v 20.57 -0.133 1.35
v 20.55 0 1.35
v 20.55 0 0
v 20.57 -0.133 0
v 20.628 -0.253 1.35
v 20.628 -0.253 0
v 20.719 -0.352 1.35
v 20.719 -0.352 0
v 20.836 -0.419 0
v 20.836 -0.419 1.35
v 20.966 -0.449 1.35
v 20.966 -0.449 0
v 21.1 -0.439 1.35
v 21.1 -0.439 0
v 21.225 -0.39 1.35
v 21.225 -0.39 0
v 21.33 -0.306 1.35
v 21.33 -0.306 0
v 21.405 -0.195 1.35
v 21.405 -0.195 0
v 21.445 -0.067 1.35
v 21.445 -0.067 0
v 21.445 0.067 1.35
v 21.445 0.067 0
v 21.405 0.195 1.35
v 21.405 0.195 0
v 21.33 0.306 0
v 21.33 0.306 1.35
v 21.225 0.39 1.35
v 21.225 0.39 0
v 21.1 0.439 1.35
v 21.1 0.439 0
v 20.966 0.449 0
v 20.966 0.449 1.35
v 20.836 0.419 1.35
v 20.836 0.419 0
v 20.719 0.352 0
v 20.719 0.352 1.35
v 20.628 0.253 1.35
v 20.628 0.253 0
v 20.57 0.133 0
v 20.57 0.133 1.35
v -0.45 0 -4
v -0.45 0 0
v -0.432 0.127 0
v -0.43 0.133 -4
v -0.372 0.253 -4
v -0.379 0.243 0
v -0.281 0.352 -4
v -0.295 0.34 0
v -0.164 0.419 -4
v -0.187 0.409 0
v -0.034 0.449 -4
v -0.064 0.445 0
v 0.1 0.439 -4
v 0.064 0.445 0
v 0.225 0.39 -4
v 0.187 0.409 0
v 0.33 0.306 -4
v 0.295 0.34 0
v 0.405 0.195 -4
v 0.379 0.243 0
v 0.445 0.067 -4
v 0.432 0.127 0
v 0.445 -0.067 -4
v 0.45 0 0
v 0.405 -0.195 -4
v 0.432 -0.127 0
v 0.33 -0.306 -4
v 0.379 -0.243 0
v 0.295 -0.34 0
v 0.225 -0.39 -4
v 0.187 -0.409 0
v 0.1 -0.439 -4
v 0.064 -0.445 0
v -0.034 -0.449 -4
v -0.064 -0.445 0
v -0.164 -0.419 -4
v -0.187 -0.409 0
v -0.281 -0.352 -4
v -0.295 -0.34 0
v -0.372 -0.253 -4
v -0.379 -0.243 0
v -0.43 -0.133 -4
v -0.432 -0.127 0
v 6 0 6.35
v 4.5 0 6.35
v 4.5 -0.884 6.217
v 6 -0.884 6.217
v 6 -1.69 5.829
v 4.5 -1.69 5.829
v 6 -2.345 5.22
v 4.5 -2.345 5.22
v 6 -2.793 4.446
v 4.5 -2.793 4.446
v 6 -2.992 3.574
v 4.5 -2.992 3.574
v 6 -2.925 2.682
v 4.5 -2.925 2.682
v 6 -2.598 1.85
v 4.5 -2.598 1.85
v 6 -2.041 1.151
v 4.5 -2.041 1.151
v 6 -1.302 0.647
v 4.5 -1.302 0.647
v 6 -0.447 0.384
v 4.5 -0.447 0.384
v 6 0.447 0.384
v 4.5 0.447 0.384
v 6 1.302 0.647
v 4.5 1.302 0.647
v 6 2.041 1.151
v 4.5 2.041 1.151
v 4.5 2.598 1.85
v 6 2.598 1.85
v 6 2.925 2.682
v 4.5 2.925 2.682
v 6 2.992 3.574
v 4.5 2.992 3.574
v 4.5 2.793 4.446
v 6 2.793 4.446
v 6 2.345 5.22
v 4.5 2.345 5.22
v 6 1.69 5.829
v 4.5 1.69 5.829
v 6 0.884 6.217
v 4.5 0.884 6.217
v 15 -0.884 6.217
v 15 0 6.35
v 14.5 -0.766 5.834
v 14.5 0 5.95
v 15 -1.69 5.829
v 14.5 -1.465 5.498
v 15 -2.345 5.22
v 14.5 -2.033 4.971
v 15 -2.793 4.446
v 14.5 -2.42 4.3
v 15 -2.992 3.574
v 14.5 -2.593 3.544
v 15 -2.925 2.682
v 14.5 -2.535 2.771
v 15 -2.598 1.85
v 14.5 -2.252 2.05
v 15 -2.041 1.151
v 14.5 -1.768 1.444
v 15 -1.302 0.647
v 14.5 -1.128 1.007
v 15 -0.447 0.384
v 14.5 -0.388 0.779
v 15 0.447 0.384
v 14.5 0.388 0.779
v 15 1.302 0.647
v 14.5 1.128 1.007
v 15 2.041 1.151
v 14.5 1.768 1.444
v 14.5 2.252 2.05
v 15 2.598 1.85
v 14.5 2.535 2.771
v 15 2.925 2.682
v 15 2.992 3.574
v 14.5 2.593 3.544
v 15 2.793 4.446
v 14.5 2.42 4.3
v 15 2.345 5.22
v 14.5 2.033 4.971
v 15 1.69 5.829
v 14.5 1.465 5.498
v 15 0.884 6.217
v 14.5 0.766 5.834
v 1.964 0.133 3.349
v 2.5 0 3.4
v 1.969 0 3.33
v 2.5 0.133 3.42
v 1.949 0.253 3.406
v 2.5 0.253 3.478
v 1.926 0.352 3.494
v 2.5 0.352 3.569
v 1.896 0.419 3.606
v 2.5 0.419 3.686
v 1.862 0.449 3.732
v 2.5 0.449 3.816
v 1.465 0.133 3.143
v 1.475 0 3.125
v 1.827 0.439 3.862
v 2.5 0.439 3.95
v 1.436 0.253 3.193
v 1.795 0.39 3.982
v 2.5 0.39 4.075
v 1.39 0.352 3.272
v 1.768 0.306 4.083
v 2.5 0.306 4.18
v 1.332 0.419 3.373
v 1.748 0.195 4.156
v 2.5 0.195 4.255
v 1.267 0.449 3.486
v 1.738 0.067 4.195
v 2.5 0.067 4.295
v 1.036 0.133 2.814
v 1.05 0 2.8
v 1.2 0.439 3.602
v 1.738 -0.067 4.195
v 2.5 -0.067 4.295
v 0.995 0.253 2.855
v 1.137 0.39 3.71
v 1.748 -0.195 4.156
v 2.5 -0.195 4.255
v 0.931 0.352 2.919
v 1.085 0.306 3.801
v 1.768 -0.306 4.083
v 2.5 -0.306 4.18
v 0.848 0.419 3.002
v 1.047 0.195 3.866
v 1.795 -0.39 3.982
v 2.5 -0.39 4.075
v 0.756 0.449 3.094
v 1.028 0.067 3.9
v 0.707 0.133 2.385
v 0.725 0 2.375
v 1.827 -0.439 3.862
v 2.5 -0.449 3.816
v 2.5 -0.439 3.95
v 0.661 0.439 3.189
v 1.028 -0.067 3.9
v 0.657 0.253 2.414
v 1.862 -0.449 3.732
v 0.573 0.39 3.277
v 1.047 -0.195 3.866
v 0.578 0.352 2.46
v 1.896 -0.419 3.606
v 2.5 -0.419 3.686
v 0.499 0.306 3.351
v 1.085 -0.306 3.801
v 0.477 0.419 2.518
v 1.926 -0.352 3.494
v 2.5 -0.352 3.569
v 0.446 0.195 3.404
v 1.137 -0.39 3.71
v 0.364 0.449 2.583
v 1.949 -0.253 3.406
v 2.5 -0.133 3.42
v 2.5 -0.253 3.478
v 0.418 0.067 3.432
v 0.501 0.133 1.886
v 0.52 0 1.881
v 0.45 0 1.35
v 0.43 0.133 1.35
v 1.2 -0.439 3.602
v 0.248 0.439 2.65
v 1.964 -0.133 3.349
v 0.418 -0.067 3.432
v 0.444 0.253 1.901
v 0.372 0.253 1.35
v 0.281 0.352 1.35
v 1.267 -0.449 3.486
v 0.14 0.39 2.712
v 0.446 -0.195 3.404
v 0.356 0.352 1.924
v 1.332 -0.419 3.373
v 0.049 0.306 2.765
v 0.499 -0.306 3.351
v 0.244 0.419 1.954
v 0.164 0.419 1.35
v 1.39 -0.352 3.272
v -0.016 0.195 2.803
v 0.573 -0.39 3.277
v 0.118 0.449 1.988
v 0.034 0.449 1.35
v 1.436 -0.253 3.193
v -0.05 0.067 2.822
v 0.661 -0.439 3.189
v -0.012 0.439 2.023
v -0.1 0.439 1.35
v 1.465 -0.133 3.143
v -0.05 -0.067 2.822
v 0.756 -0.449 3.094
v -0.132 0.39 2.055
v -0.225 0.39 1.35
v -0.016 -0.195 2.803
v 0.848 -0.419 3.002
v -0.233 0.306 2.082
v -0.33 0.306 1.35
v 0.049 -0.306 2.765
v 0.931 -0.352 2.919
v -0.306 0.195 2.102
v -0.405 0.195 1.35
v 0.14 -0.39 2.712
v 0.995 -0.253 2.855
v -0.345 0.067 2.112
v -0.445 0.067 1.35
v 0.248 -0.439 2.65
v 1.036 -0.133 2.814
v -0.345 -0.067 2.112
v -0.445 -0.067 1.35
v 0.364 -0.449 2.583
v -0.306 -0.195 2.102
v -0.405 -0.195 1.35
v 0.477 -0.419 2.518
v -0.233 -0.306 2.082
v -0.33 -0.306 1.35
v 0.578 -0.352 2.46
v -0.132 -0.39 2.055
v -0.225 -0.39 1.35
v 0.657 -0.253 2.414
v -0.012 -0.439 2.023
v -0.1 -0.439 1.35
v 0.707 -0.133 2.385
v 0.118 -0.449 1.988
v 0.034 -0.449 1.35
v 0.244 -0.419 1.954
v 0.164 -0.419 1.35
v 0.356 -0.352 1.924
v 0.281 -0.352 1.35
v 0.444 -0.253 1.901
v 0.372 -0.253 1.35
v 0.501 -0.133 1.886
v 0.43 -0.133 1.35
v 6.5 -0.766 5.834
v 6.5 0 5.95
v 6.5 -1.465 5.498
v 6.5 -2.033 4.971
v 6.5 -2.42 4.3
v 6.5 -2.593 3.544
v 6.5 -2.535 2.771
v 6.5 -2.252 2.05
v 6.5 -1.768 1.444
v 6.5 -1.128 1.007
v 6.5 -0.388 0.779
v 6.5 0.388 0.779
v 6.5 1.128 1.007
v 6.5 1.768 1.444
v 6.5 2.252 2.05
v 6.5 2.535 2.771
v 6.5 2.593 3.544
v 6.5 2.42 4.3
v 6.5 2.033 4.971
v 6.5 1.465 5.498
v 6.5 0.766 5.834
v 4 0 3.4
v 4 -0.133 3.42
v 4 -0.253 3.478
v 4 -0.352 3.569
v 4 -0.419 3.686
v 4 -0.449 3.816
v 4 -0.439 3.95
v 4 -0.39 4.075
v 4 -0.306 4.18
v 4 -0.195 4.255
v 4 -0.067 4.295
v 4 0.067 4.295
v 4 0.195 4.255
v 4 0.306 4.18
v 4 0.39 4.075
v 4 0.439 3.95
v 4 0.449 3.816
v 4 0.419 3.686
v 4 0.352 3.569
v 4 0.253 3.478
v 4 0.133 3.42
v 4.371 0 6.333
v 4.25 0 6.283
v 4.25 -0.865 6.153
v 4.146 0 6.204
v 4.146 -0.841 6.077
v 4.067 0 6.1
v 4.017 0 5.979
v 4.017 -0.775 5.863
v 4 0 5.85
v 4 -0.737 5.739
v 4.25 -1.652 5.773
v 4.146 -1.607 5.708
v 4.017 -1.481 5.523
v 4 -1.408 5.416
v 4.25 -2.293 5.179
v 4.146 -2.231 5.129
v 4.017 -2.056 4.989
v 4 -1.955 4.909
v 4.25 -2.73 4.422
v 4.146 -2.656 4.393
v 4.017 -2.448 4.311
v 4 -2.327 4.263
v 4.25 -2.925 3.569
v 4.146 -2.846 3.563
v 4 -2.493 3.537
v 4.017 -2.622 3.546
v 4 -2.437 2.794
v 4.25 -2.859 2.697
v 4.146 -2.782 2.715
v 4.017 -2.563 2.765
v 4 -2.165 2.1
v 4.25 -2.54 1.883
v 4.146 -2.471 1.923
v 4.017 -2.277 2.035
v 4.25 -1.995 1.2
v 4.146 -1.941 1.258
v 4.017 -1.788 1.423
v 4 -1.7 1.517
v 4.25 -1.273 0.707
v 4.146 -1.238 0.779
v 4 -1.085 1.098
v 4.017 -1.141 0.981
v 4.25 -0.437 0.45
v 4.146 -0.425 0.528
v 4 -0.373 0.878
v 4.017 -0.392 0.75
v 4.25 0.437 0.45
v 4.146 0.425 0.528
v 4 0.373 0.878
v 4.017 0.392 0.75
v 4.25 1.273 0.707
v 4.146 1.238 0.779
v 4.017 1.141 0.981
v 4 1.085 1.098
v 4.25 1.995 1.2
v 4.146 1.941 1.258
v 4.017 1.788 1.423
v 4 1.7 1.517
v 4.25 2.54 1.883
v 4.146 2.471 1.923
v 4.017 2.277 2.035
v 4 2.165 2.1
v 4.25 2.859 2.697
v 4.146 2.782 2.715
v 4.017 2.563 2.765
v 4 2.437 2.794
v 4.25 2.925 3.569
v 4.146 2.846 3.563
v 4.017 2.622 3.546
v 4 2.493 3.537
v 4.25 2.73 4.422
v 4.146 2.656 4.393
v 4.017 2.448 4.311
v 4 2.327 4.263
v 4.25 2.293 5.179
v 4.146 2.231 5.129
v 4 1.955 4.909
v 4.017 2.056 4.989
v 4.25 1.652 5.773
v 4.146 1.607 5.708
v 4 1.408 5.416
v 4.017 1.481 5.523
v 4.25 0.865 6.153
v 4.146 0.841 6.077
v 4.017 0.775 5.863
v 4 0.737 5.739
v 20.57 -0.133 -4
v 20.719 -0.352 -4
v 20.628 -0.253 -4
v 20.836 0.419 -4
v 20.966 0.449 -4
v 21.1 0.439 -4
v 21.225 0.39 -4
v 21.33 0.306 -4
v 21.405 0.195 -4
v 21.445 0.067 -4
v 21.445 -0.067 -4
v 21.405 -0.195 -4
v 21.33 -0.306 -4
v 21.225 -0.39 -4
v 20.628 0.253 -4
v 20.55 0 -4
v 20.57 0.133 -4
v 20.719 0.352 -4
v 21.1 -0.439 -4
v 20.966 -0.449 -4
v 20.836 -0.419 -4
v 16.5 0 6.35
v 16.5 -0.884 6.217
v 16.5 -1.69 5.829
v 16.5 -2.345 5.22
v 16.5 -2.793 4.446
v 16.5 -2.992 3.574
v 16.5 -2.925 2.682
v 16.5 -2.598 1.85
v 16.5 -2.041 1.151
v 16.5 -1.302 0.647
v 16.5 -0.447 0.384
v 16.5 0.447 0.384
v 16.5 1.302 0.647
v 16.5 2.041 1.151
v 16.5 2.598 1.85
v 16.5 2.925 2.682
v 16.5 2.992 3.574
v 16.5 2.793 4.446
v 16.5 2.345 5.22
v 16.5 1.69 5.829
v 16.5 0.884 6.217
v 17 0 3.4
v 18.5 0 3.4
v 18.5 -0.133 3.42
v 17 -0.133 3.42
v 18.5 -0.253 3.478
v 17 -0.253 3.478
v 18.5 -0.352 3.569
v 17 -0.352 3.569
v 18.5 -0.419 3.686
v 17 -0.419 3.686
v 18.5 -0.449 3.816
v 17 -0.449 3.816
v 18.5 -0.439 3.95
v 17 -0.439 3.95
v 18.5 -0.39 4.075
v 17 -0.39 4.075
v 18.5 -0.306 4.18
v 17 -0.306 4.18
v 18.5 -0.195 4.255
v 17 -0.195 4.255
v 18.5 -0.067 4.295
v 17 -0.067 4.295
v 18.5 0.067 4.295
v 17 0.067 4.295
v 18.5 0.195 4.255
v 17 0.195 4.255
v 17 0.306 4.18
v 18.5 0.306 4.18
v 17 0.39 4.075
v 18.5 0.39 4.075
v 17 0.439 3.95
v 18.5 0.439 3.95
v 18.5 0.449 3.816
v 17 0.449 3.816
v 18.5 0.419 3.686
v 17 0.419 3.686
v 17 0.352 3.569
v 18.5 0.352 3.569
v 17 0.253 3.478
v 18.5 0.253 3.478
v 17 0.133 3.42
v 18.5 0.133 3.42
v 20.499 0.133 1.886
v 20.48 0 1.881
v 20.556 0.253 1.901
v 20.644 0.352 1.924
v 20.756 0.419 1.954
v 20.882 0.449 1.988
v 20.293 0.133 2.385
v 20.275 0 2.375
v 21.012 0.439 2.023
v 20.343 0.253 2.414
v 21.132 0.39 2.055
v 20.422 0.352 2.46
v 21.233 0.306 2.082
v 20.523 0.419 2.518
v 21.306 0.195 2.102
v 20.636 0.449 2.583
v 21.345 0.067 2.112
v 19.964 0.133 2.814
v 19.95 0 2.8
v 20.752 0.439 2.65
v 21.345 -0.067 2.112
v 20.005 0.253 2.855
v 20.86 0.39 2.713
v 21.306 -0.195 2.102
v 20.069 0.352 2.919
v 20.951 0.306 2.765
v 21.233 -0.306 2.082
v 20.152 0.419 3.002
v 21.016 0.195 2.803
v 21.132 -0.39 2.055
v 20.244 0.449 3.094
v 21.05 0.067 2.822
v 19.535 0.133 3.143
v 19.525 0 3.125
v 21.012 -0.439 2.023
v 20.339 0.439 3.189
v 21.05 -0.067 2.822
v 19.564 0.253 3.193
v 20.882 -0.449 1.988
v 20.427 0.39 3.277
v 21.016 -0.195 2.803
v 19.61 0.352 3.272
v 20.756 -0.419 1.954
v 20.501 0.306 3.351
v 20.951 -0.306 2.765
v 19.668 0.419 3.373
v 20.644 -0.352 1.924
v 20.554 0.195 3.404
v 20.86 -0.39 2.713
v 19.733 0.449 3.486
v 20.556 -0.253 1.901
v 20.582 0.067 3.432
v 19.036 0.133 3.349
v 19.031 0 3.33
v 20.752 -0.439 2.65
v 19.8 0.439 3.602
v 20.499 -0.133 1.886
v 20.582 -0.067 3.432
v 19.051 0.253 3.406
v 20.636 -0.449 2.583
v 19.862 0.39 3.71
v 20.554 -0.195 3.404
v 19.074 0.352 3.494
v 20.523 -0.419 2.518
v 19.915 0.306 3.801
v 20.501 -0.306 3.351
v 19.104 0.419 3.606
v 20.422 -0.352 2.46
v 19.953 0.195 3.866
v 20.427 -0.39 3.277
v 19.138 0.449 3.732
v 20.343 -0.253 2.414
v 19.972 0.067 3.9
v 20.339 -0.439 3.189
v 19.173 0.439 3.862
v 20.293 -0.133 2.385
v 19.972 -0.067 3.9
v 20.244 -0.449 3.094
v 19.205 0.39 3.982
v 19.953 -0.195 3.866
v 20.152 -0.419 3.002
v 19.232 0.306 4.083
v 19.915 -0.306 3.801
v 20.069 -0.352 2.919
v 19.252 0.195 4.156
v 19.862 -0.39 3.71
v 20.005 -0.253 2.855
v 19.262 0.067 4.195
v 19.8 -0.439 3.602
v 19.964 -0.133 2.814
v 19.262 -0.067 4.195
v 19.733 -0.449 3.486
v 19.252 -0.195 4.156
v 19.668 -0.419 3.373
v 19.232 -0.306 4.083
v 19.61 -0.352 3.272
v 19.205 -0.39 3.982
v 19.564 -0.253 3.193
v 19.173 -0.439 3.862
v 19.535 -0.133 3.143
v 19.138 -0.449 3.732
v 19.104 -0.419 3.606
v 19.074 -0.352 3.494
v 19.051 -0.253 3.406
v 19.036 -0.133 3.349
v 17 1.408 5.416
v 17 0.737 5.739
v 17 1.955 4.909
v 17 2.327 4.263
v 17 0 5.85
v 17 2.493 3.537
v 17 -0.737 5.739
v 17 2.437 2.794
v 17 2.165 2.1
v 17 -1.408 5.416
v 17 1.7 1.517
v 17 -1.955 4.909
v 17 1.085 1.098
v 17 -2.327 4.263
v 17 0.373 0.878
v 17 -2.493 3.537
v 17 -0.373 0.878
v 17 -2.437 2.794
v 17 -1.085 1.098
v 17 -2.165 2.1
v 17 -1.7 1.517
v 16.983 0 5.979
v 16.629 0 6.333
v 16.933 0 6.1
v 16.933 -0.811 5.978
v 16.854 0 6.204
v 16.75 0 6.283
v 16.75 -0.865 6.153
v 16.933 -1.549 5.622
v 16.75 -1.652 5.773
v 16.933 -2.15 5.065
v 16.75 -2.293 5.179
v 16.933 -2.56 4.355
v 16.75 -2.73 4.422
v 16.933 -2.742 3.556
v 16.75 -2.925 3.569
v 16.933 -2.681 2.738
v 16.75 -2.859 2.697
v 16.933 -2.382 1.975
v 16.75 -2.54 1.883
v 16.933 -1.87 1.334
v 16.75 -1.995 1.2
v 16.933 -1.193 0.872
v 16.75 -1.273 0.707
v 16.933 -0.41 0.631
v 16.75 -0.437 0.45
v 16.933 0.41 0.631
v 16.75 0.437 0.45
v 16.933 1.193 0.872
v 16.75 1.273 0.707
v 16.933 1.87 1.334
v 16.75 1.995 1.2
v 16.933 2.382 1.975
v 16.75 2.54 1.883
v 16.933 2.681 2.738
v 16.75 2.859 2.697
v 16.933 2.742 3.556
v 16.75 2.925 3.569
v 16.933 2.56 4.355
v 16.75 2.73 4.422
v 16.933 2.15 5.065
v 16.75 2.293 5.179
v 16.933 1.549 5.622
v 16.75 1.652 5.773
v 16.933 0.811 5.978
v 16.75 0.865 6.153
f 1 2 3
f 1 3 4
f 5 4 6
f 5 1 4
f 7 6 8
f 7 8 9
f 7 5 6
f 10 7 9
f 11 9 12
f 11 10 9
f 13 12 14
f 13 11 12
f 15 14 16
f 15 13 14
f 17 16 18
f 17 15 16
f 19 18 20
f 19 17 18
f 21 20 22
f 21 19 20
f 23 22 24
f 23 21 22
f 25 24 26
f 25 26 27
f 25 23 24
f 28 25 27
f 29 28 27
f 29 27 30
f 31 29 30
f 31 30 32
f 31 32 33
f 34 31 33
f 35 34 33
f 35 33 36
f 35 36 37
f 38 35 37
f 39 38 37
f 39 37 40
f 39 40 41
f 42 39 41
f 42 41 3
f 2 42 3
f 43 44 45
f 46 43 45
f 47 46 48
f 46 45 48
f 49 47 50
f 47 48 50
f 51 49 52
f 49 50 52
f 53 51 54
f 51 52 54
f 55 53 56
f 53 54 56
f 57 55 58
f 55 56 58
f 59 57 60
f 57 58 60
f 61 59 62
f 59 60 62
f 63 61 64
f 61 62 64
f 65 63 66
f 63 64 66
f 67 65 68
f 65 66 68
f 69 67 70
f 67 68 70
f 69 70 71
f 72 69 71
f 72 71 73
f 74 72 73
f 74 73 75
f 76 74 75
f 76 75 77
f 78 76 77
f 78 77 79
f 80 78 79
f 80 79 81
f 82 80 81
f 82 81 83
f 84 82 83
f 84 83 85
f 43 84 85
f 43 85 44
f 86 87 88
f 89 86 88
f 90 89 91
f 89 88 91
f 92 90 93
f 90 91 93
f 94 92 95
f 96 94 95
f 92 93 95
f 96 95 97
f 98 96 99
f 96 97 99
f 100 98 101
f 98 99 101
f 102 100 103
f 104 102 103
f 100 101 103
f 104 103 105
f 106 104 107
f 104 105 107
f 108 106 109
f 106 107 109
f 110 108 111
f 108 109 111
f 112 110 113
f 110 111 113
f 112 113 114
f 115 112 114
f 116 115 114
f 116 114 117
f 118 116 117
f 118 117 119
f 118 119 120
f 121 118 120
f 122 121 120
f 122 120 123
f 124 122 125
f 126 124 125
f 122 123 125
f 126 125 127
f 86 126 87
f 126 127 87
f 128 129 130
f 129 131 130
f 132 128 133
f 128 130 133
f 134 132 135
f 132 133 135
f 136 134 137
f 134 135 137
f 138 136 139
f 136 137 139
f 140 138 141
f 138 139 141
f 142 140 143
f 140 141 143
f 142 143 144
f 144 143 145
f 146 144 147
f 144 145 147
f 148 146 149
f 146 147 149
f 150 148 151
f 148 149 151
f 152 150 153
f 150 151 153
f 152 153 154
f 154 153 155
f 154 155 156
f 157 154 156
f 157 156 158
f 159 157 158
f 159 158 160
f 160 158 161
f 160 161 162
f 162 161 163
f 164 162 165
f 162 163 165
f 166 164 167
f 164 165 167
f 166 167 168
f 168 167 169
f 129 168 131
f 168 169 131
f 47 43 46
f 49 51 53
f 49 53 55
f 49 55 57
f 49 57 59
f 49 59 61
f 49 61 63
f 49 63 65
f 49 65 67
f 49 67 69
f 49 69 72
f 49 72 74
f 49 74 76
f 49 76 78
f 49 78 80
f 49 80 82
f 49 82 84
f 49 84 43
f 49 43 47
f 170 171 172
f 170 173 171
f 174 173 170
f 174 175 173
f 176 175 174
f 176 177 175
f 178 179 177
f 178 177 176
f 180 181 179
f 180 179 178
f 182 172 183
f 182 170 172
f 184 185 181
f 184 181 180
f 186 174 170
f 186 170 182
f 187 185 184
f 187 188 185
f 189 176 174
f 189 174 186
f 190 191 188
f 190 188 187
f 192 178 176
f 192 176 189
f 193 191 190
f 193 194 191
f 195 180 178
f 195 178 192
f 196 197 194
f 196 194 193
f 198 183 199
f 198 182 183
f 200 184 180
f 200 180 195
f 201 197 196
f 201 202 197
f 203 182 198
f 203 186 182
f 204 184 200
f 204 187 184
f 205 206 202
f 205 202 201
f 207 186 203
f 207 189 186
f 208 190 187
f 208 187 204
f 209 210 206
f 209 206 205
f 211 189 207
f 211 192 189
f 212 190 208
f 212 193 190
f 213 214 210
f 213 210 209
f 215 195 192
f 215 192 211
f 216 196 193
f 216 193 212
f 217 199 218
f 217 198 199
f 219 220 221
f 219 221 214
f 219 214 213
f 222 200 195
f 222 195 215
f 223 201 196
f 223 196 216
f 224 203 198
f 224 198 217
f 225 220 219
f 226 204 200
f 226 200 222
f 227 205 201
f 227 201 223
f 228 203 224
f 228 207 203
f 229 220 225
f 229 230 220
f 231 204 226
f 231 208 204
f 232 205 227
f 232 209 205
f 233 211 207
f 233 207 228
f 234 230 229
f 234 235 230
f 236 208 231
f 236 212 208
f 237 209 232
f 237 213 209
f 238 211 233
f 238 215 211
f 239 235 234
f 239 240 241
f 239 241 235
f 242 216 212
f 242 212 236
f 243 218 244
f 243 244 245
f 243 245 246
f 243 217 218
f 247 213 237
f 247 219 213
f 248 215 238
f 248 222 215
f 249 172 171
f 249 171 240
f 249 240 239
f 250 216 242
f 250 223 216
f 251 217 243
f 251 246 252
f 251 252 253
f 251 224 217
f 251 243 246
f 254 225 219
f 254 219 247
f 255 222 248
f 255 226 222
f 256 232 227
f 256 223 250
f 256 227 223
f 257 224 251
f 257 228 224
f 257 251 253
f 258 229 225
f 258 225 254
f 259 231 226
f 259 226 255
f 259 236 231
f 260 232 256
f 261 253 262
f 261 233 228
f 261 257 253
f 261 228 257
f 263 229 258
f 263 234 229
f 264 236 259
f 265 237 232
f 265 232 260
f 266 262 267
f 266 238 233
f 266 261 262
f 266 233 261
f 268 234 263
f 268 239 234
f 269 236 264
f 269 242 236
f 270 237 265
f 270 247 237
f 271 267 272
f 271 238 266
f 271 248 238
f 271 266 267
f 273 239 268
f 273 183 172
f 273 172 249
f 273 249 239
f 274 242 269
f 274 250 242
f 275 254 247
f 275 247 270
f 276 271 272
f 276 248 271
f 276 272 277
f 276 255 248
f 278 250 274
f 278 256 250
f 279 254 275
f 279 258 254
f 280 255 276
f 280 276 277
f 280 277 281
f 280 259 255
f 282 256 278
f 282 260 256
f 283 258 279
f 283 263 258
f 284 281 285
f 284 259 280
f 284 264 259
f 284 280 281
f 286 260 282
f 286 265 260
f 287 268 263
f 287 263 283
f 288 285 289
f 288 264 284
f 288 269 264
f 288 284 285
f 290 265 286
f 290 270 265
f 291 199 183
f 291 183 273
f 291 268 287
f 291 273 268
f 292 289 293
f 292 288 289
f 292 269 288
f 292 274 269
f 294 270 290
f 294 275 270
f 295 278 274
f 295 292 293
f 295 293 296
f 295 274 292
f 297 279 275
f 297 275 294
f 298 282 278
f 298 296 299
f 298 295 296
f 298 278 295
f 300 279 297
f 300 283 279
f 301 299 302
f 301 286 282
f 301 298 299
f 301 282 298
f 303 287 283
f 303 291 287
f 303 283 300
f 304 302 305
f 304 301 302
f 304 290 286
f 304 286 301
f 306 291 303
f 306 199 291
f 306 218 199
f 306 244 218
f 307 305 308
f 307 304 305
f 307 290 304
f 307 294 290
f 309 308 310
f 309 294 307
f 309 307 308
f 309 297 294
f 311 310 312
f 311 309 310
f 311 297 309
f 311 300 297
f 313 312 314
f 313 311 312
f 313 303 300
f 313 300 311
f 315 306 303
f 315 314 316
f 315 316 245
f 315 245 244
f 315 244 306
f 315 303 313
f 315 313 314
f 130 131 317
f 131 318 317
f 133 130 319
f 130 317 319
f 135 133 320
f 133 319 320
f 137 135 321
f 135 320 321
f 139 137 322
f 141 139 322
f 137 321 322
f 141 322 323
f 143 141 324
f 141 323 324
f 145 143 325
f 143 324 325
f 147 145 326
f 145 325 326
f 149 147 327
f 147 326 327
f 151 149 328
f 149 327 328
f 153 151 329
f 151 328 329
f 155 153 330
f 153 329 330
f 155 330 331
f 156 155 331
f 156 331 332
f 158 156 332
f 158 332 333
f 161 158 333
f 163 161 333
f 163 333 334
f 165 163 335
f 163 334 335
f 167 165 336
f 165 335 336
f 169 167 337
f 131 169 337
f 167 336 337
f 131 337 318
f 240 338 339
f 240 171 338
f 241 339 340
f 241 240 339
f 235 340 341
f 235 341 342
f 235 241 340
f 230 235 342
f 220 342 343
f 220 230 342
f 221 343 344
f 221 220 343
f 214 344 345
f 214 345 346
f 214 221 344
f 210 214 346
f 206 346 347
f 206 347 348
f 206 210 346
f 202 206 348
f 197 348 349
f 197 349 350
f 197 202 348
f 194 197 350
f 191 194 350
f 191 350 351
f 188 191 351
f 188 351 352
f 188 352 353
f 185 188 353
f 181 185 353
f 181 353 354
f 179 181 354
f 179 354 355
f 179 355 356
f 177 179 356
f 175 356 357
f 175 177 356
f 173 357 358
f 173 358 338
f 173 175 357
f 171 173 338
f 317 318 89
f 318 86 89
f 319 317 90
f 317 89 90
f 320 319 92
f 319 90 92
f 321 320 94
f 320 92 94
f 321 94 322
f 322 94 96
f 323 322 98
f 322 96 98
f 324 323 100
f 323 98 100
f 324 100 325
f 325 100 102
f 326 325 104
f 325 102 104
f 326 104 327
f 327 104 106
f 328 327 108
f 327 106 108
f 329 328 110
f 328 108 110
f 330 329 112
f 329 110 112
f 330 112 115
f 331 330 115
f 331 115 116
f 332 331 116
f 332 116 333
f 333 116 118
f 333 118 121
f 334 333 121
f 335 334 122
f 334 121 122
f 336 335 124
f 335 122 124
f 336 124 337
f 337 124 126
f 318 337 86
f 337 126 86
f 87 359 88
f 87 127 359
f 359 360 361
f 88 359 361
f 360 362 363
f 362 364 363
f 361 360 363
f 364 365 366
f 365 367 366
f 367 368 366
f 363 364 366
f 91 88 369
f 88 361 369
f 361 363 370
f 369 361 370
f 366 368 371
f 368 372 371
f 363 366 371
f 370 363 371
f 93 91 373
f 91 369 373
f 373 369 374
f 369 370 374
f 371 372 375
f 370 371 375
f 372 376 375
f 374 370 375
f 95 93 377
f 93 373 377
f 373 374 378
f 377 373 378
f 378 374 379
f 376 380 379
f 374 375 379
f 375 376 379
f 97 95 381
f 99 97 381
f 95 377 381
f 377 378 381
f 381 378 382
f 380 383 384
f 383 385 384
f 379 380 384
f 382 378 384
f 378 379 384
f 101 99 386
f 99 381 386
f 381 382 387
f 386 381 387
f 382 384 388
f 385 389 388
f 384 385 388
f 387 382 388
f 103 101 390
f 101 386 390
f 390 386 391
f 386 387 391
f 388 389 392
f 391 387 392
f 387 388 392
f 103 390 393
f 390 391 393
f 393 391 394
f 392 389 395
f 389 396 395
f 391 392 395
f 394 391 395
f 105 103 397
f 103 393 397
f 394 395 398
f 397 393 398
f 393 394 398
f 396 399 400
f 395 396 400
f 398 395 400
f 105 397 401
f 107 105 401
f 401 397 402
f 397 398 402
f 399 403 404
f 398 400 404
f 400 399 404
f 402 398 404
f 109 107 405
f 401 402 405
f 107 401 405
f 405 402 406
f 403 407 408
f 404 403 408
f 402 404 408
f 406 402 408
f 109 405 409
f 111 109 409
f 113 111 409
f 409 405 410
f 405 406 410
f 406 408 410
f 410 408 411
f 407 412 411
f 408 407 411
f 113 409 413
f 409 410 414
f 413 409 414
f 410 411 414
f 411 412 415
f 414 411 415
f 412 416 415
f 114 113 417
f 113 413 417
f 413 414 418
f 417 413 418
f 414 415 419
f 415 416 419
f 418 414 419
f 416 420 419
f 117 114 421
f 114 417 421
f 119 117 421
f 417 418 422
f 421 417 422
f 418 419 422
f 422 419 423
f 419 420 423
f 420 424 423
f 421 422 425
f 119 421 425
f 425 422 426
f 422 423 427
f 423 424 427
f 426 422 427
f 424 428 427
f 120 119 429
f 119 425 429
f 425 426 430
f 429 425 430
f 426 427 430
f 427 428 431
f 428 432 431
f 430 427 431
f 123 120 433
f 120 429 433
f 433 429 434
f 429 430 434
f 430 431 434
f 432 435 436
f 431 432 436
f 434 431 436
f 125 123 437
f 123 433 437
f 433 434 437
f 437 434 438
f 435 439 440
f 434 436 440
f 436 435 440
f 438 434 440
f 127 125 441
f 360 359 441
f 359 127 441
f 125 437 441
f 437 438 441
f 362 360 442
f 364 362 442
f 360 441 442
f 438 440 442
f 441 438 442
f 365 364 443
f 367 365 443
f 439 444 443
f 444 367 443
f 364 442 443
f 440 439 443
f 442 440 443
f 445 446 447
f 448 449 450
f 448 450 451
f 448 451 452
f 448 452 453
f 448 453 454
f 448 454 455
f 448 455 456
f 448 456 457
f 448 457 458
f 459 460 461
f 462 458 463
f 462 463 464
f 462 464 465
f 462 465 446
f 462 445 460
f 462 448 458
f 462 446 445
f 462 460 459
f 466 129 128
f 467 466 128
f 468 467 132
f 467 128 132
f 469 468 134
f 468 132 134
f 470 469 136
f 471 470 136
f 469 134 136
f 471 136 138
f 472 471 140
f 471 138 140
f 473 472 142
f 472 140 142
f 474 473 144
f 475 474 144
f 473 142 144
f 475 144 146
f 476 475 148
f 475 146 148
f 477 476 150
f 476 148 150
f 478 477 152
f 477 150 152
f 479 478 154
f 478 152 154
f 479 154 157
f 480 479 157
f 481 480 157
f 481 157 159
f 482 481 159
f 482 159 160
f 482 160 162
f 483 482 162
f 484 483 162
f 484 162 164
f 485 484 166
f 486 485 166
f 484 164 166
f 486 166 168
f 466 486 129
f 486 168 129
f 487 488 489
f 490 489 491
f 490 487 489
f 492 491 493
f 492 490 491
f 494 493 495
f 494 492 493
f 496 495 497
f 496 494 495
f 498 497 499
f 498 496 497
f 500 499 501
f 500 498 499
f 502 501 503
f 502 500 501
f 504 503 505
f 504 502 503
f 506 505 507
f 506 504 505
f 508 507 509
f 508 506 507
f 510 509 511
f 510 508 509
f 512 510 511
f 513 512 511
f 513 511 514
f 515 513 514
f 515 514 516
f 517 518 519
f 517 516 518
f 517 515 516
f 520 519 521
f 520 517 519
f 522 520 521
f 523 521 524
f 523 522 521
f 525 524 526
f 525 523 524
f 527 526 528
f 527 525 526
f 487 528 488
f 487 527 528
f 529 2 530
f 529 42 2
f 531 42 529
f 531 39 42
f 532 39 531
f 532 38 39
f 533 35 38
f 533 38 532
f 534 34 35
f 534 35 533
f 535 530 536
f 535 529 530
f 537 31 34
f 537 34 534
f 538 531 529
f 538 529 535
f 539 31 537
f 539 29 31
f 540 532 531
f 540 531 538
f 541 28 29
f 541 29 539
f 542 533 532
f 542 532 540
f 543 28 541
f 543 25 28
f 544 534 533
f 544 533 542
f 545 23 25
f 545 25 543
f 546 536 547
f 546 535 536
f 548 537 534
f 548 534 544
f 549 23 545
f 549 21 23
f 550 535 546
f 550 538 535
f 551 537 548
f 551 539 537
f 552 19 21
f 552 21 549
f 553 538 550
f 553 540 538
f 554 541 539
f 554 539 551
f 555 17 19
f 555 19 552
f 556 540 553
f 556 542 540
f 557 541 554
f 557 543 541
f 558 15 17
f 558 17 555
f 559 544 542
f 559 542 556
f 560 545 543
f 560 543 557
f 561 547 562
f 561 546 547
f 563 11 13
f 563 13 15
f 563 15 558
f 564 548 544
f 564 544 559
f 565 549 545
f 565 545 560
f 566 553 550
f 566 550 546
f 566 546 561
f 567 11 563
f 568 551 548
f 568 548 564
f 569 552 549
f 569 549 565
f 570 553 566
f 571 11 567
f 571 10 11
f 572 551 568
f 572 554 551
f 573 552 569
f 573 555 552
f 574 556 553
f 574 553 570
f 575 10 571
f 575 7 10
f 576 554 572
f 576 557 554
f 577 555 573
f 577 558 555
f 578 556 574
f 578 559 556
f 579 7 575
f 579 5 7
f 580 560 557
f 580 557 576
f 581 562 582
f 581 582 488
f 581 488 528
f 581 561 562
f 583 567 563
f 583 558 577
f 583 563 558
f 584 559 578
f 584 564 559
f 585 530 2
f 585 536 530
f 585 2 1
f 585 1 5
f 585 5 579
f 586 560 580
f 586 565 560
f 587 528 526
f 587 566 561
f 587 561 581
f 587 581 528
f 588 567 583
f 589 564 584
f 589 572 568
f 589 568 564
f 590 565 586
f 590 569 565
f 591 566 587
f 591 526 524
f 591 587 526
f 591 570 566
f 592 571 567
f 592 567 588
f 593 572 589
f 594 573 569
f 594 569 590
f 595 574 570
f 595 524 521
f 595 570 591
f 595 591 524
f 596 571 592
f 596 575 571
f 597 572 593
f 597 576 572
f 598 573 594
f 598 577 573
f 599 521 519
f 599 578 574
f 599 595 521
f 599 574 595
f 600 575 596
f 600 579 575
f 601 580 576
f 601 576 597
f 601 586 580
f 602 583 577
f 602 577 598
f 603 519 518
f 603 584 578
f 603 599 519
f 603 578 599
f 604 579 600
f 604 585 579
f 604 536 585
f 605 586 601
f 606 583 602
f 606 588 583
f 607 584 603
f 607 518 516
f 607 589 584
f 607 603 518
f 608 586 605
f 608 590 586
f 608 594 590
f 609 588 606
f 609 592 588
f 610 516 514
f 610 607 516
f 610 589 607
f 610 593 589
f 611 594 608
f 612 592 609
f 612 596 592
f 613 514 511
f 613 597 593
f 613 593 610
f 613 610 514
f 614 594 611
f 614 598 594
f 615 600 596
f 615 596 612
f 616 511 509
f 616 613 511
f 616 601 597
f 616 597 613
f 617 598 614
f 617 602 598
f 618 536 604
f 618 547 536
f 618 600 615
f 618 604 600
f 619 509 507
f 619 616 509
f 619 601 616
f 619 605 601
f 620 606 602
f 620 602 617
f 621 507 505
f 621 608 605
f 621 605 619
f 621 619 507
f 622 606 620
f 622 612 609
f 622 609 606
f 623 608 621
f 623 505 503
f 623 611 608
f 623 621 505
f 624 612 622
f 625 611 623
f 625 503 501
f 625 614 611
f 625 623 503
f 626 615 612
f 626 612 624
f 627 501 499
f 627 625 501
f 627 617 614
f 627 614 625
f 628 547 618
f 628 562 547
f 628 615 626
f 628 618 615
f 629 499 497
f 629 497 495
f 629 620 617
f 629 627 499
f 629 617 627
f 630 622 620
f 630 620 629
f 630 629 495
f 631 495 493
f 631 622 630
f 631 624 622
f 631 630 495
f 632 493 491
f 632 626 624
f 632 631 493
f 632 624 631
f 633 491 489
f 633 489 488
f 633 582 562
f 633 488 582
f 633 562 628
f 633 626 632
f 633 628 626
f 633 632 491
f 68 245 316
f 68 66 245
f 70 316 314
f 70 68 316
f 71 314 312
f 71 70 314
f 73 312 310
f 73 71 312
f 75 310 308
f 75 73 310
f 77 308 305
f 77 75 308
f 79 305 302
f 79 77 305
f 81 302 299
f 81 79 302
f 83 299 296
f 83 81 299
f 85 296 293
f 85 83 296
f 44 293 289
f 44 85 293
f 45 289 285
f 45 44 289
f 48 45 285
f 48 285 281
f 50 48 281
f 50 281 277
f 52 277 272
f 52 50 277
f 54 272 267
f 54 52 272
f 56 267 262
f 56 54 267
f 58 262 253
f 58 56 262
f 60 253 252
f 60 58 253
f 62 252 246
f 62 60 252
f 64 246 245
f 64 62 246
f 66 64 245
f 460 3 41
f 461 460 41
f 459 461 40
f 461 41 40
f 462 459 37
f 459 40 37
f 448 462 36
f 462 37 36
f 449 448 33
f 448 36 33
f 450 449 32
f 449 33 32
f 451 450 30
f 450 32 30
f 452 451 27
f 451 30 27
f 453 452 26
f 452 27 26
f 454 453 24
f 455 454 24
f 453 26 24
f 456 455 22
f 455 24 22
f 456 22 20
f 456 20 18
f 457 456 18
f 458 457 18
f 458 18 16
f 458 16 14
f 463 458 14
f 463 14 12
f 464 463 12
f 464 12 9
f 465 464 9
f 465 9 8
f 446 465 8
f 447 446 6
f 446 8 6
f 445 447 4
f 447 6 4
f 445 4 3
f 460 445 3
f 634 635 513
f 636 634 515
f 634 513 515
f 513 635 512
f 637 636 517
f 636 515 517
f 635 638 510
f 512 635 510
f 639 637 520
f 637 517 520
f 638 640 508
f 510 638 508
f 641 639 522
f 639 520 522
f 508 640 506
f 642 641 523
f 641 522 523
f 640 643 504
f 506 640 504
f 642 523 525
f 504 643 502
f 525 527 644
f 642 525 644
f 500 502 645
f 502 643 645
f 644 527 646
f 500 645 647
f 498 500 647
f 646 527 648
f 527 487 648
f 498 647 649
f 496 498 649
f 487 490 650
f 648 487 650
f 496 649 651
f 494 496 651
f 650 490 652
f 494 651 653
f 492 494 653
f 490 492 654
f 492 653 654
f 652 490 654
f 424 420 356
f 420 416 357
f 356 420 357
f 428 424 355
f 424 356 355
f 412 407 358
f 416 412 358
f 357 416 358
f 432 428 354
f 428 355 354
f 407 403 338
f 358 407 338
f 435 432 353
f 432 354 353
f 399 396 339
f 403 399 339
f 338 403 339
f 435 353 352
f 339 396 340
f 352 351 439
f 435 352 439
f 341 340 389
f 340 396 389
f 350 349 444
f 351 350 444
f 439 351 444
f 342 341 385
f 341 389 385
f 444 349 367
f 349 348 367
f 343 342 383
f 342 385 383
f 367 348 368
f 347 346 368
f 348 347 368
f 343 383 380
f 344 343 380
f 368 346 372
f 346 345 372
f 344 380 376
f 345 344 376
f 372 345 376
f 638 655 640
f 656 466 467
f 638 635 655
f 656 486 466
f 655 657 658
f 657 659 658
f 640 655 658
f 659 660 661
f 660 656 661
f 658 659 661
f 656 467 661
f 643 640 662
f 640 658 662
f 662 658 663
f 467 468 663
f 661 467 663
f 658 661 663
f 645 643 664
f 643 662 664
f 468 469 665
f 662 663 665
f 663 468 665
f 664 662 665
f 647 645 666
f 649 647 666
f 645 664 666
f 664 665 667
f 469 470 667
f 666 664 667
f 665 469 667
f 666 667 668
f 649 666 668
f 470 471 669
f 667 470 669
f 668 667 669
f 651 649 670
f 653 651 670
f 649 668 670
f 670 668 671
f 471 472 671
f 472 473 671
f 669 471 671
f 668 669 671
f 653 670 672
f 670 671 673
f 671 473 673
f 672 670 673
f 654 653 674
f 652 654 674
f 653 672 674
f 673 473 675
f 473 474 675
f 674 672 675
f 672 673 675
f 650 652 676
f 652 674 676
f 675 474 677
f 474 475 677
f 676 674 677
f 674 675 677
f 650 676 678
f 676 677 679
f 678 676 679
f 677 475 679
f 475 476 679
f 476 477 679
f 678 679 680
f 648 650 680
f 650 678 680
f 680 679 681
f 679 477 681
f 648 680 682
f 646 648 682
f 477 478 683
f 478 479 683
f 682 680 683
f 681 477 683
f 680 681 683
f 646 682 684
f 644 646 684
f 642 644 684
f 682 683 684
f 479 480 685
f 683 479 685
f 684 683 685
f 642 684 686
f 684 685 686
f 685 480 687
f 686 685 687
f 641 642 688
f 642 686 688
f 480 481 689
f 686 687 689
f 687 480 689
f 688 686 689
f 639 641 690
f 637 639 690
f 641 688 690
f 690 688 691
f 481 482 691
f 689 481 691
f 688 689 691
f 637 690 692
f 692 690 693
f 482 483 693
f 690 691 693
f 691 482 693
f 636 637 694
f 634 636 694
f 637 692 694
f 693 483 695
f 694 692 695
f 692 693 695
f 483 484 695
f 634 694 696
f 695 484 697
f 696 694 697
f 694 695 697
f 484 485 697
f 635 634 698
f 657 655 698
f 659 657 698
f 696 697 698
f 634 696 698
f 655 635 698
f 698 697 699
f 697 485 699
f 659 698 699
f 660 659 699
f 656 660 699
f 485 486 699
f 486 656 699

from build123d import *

# Parameters (mm, degrees)
SKETCH_1_R      = 0.45
FILLET_1_R      = 0.5
SKETCH_4_R      = 0.45
EXTRUDE_1_DEPTH = 4


with BuildPart() as part:
    # Эскиз2 → Повернуть1 (revolve)
    with BuildSketch(Plane.XY.offset(3.35), mode=Mode.PRIVATE) as revolve_1_sk:
        Polygon((4, 0), (17, 0), (17, 3), (15, 3), (14.5, 2.6), (6.5, 2.6), (6, 3), (4, 3), align=None)
    revolve(revolve_1_sk.sketch.rotate(Axis((0, 0, 3.35), (1, 0, 0)), 90), axis=Axis((0, 0, 3.35), (1, 0, 0)))

    # По траектории1: sweep along a path in Эскиз3
    with BuildLine(Plane(origin=(0, 0, 0), x_dir=(1, 0, 0), z_dir=(0, 1, 0))) as sweep_1_path:
        Line((20.5, 0), (20.5, -1.35))
        ThreePointArc((20.5, -1.35), (19.914213562, -2.764213562), (18.5, -3.35))
        Line((18.5, -3.35), (2.5, -3.35))
        ThreePointArc((2.5, -3.35), (1.085786438, -2.764213562), (0.5, -1.35))
        Line((0.5, -1.35), (0.5, 0))
    # Эскиз1 → По траектории1 (sweep)
    with BuildSketch(Plane.XY):
        Circle(SKETCH_1_R)
    sweep(path=sweep_1_path.line)

    # Скругление1
    fillet_1_edges = [part.edges().sort_by_distance(p)[0] for p in [
        (17, 0, 0.35),
        (4, 0, 0.35),
    ]]
    fillet(fillet_1_edges, radius=FILLET_1_R)

    # Эскиз4 → Вытянуть1 (add)
    with BuildSketch(Plane(origin=(0, 0, 0), x_dir=(-1, 0, 0), z_dir=(0, 0, -1))):
        Circle(SKETCH_4_R)
        with Locations((-21, 0)):
            Circle(SKETCH_4_R)
    extrude(amount=EXTRUDE_1_DEPTH)


solid = part.part
